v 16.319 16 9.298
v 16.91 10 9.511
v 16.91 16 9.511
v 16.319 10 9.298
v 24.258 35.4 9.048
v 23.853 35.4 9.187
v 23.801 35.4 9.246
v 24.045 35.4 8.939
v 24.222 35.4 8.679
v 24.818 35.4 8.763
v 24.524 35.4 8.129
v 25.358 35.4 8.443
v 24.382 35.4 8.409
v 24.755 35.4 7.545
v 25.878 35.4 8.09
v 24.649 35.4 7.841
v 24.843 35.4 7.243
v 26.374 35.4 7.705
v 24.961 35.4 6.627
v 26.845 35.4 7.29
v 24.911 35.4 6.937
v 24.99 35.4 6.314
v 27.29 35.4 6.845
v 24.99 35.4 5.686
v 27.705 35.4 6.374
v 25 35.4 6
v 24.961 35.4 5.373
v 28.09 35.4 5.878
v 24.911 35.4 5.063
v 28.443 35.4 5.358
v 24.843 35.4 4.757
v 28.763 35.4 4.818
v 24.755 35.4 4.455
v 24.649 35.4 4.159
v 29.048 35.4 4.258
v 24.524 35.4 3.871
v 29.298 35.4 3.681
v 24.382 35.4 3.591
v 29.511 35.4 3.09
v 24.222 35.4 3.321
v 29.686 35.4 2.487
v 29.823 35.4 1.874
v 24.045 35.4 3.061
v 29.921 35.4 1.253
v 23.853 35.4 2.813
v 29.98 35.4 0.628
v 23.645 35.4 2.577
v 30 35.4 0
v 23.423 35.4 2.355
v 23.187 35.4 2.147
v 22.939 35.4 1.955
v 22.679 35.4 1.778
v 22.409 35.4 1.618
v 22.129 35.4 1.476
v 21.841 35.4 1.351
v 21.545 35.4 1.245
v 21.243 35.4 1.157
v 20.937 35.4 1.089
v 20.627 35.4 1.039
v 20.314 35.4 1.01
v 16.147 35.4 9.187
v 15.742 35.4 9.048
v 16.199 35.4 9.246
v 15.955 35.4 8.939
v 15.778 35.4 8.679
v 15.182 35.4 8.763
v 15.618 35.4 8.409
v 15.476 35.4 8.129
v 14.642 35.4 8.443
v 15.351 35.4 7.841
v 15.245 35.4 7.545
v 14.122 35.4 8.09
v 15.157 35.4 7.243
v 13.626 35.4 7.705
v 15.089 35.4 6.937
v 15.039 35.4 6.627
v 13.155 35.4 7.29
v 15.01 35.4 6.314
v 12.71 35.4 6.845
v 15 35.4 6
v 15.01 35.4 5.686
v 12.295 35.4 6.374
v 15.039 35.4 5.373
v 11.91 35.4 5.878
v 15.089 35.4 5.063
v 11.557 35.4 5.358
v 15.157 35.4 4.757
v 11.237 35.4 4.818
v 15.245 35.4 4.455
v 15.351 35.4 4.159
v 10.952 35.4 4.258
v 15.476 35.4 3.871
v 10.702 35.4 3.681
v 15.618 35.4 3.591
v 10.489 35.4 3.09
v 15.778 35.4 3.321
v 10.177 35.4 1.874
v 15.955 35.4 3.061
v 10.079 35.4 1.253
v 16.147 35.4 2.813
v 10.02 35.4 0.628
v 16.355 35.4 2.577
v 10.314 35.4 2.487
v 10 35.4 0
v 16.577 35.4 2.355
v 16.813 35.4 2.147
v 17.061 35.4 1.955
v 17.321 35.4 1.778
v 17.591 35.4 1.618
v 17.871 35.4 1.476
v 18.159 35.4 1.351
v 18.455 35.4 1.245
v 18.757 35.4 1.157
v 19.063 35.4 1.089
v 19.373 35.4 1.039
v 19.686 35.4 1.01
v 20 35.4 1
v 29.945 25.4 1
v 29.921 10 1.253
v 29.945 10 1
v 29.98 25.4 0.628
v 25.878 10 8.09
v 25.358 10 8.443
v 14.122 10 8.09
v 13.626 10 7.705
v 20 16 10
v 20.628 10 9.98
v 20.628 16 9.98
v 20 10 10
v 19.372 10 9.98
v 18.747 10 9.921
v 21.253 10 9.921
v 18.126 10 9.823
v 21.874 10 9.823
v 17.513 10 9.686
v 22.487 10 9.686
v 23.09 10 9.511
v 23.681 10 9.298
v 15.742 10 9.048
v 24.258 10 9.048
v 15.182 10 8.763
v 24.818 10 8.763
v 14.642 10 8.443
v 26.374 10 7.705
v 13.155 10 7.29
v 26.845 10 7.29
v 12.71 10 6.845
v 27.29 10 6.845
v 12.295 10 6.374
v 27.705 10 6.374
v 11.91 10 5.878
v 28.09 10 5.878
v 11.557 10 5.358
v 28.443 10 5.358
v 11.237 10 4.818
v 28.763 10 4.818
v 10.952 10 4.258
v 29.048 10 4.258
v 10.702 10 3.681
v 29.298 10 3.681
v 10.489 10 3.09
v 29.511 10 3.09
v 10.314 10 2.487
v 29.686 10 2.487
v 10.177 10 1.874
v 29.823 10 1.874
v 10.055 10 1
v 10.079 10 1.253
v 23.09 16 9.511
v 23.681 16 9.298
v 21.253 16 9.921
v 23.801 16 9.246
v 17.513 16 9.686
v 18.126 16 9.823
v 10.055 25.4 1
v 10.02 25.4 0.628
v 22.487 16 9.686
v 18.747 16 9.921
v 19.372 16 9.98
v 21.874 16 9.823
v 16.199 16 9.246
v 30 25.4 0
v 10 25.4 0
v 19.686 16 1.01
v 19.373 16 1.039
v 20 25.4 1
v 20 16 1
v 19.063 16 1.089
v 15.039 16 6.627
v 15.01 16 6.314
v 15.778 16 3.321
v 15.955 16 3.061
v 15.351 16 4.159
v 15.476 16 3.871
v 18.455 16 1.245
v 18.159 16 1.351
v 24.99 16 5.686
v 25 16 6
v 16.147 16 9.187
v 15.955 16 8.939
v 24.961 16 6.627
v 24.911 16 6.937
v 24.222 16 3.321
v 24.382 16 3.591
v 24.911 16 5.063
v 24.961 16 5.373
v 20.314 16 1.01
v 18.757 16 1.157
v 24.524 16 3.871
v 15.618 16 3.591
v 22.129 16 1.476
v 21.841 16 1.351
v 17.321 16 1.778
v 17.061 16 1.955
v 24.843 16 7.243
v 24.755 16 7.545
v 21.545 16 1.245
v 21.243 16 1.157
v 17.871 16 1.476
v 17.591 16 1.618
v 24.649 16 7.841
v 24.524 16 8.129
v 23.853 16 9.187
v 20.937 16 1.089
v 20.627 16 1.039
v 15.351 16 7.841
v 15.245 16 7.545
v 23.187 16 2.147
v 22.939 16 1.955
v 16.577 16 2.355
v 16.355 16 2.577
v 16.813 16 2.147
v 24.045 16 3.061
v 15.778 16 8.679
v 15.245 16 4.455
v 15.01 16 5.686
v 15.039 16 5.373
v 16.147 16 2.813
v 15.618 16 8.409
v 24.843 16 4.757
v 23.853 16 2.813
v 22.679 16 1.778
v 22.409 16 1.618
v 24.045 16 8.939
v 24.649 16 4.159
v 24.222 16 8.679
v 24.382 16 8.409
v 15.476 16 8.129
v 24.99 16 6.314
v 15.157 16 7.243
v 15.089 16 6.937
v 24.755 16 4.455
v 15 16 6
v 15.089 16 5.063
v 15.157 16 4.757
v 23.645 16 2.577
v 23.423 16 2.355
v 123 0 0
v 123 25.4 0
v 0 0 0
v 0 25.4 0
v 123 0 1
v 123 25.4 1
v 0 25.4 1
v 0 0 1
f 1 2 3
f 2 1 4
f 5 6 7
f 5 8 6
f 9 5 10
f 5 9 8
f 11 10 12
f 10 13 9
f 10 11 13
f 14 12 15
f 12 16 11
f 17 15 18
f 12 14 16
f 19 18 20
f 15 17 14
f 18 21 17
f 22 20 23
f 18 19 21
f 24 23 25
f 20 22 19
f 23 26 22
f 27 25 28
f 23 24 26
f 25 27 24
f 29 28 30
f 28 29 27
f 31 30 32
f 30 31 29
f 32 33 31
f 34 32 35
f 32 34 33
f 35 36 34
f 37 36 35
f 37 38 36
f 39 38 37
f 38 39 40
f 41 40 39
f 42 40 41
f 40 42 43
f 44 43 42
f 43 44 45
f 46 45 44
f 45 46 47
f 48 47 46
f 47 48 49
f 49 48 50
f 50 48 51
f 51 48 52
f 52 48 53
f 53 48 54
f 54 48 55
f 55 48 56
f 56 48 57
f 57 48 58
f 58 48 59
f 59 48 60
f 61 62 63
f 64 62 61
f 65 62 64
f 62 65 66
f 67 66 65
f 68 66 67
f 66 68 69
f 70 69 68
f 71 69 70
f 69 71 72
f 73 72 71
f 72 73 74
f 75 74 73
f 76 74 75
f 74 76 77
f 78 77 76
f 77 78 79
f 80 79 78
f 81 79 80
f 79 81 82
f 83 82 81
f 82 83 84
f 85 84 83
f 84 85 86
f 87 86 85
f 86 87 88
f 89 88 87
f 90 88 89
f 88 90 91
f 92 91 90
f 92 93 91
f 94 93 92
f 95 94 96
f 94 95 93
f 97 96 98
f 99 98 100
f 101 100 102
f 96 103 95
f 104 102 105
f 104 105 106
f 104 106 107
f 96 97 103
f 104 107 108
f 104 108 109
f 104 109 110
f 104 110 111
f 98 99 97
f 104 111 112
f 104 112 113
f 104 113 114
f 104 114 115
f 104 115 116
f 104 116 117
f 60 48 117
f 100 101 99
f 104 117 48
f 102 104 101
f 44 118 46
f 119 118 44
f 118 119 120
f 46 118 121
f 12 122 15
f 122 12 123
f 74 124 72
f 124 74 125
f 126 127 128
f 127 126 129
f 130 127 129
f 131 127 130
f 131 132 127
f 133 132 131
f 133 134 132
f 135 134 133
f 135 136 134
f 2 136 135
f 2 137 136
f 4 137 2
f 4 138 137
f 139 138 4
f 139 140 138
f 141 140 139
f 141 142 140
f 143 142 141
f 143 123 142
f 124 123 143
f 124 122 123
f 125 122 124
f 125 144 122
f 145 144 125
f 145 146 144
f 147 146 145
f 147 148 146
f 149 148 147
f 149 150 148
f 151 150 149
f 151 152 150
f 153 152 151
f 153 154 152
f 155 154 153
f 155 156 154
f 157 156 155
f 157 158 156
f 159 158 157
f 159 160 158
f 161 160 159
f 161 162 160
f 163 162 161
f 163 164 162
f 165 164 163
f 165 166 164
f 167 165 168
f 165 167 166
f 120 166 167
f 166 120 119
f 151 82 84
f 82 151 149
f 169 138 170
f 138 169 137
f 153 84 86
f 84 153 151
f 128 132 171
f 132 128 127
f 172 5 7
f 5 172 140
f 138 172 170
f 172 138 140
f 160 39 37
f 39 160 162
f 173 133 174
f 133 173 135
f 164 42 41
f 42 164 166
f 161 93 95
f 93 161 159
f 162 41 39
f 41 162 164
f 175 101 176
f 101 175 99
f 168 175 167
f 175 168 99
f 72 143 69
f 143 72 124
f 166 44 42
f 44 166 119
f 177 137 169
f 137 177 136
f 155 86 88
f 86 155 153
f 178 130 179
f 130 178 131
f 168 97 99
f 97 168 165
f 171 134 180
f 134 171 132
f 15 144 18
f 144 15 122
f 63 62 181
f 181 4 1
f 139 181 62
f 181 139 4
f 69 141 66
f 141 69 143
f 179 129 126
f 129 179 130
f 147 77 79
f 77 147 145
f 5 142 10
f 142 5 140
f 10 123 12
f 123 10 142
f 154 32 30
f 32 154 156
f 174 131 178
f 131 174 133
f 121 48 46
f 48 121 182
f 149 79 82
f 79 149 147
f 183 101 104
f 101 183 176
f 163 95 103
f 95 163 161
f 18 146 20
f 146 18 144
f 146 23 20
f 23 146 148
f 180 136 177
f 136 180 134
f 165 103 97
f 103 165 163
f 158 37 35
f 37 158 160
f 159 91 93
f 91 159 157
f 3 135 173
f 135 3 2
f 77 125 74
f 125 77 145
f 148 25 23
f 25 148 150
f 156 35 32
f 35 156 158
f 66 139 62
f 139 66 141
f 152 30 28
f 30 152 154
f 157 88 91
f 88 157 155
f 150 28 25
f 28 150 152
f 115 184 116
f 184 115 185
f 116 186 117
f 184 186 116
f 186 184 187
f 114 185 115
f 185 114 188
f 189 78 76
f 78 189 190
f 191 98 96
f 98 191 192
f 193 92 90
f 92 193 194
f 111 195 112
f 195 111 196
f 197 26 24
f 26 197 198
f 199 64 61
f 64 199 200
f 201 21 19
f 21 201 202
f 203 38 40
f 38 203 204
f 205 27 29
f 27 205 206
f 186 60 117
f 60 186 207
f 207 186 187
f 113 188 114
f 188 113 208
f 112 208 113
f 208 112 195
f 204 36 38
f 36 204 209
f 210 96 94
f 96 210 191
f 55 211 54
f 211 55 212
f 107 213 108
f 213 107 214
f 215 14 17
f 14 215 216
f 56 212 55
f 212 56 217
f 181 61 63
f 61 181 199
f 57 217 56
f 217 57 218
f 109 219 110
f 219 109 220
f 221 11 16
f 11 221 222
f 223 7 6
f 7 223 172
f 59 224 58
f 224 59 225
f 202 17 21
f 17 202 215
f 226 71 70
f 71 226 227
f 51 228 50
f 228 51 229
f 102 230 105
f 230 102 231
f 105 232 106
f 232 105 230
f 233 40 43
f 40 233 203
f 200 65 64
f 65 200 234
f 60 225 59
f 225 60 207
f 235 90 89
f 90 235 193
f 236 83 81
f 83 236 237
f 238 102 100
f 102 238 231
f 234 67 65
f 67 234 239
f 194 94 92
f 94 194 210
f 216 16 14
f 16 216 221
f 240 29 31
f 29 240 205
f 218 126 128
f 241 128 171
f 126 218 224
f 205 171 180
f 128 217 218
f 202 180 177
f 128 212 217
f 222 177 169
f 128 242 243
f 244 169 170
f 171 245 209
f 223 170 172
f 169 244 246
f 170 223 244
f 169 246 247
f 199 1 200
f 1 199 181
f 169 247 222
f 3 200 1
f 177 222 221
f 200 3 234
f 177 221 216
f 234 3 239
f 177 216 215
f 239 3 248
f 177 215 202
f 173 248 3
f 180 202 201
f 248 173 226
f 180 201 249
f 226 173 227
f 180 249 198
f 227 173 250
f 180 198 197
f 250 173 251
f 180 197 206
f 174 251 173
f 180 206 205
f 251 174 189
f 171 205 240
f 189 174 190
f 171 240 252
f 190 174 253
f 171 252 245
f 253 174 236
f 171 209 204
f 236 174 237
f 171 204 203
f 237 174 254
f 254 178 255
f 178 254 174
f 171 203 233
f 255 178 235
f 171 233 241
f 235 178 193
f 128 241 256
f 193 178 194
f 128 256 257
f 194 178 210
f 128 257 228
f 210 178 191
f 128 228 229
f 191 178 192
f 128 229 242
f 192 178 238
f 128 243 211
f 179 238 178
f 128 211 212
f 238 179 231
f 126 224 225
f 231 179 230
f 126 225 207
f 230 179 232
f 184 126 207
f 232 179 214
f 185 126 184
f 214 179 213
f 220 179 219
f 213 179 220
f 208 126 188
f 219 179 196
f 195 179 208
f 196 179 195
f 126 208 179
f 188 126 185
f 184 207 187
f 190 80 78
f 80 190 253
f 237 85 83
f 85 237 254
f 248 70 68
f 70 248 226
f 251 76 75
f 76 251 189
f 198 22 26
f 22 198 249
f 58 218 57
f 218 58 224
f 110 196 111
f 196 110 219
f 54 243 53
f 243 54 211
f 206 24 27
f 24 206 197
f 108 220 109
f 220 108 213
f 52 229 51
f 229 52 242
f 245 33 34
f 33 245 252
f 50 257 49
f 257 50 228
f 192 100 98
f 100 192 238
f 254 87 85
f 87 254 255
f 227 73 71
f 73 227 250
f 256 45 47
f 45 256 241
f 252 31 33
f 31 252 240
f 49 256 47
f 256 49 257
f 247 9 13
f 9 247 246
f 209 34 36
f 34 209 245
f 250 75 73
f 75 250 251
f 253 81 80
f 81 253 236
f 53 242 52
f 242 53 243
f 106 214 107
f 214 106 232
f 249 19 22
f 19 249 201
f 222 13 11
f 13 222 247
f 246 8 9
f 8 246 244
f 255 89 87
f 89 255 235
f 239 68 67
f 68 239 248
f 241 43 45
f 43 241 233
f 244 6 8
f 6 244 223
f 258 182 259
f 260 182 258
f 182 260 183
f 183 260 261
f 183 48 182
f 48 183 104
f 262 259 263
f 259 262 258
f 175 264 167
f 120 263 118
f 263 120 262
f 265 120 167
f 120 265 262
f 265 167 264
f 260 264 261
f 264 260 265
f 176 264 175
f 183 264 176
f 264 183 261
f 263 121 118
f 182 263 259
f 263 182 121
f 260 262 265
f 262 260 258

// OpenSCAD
$fn = 100;
cube([123,25.4,1]);

difference(){
translate([20,10,0]){
	rotate(a=[0,90,90]) {
		difference() {
		cylinder(h=25.4,r=10);
		translate([-6,0,6]) cylinder(h=20,r=5);
		}
	}
}

translate([10,9,-10]){
cube([22,27,10]);
}
}
